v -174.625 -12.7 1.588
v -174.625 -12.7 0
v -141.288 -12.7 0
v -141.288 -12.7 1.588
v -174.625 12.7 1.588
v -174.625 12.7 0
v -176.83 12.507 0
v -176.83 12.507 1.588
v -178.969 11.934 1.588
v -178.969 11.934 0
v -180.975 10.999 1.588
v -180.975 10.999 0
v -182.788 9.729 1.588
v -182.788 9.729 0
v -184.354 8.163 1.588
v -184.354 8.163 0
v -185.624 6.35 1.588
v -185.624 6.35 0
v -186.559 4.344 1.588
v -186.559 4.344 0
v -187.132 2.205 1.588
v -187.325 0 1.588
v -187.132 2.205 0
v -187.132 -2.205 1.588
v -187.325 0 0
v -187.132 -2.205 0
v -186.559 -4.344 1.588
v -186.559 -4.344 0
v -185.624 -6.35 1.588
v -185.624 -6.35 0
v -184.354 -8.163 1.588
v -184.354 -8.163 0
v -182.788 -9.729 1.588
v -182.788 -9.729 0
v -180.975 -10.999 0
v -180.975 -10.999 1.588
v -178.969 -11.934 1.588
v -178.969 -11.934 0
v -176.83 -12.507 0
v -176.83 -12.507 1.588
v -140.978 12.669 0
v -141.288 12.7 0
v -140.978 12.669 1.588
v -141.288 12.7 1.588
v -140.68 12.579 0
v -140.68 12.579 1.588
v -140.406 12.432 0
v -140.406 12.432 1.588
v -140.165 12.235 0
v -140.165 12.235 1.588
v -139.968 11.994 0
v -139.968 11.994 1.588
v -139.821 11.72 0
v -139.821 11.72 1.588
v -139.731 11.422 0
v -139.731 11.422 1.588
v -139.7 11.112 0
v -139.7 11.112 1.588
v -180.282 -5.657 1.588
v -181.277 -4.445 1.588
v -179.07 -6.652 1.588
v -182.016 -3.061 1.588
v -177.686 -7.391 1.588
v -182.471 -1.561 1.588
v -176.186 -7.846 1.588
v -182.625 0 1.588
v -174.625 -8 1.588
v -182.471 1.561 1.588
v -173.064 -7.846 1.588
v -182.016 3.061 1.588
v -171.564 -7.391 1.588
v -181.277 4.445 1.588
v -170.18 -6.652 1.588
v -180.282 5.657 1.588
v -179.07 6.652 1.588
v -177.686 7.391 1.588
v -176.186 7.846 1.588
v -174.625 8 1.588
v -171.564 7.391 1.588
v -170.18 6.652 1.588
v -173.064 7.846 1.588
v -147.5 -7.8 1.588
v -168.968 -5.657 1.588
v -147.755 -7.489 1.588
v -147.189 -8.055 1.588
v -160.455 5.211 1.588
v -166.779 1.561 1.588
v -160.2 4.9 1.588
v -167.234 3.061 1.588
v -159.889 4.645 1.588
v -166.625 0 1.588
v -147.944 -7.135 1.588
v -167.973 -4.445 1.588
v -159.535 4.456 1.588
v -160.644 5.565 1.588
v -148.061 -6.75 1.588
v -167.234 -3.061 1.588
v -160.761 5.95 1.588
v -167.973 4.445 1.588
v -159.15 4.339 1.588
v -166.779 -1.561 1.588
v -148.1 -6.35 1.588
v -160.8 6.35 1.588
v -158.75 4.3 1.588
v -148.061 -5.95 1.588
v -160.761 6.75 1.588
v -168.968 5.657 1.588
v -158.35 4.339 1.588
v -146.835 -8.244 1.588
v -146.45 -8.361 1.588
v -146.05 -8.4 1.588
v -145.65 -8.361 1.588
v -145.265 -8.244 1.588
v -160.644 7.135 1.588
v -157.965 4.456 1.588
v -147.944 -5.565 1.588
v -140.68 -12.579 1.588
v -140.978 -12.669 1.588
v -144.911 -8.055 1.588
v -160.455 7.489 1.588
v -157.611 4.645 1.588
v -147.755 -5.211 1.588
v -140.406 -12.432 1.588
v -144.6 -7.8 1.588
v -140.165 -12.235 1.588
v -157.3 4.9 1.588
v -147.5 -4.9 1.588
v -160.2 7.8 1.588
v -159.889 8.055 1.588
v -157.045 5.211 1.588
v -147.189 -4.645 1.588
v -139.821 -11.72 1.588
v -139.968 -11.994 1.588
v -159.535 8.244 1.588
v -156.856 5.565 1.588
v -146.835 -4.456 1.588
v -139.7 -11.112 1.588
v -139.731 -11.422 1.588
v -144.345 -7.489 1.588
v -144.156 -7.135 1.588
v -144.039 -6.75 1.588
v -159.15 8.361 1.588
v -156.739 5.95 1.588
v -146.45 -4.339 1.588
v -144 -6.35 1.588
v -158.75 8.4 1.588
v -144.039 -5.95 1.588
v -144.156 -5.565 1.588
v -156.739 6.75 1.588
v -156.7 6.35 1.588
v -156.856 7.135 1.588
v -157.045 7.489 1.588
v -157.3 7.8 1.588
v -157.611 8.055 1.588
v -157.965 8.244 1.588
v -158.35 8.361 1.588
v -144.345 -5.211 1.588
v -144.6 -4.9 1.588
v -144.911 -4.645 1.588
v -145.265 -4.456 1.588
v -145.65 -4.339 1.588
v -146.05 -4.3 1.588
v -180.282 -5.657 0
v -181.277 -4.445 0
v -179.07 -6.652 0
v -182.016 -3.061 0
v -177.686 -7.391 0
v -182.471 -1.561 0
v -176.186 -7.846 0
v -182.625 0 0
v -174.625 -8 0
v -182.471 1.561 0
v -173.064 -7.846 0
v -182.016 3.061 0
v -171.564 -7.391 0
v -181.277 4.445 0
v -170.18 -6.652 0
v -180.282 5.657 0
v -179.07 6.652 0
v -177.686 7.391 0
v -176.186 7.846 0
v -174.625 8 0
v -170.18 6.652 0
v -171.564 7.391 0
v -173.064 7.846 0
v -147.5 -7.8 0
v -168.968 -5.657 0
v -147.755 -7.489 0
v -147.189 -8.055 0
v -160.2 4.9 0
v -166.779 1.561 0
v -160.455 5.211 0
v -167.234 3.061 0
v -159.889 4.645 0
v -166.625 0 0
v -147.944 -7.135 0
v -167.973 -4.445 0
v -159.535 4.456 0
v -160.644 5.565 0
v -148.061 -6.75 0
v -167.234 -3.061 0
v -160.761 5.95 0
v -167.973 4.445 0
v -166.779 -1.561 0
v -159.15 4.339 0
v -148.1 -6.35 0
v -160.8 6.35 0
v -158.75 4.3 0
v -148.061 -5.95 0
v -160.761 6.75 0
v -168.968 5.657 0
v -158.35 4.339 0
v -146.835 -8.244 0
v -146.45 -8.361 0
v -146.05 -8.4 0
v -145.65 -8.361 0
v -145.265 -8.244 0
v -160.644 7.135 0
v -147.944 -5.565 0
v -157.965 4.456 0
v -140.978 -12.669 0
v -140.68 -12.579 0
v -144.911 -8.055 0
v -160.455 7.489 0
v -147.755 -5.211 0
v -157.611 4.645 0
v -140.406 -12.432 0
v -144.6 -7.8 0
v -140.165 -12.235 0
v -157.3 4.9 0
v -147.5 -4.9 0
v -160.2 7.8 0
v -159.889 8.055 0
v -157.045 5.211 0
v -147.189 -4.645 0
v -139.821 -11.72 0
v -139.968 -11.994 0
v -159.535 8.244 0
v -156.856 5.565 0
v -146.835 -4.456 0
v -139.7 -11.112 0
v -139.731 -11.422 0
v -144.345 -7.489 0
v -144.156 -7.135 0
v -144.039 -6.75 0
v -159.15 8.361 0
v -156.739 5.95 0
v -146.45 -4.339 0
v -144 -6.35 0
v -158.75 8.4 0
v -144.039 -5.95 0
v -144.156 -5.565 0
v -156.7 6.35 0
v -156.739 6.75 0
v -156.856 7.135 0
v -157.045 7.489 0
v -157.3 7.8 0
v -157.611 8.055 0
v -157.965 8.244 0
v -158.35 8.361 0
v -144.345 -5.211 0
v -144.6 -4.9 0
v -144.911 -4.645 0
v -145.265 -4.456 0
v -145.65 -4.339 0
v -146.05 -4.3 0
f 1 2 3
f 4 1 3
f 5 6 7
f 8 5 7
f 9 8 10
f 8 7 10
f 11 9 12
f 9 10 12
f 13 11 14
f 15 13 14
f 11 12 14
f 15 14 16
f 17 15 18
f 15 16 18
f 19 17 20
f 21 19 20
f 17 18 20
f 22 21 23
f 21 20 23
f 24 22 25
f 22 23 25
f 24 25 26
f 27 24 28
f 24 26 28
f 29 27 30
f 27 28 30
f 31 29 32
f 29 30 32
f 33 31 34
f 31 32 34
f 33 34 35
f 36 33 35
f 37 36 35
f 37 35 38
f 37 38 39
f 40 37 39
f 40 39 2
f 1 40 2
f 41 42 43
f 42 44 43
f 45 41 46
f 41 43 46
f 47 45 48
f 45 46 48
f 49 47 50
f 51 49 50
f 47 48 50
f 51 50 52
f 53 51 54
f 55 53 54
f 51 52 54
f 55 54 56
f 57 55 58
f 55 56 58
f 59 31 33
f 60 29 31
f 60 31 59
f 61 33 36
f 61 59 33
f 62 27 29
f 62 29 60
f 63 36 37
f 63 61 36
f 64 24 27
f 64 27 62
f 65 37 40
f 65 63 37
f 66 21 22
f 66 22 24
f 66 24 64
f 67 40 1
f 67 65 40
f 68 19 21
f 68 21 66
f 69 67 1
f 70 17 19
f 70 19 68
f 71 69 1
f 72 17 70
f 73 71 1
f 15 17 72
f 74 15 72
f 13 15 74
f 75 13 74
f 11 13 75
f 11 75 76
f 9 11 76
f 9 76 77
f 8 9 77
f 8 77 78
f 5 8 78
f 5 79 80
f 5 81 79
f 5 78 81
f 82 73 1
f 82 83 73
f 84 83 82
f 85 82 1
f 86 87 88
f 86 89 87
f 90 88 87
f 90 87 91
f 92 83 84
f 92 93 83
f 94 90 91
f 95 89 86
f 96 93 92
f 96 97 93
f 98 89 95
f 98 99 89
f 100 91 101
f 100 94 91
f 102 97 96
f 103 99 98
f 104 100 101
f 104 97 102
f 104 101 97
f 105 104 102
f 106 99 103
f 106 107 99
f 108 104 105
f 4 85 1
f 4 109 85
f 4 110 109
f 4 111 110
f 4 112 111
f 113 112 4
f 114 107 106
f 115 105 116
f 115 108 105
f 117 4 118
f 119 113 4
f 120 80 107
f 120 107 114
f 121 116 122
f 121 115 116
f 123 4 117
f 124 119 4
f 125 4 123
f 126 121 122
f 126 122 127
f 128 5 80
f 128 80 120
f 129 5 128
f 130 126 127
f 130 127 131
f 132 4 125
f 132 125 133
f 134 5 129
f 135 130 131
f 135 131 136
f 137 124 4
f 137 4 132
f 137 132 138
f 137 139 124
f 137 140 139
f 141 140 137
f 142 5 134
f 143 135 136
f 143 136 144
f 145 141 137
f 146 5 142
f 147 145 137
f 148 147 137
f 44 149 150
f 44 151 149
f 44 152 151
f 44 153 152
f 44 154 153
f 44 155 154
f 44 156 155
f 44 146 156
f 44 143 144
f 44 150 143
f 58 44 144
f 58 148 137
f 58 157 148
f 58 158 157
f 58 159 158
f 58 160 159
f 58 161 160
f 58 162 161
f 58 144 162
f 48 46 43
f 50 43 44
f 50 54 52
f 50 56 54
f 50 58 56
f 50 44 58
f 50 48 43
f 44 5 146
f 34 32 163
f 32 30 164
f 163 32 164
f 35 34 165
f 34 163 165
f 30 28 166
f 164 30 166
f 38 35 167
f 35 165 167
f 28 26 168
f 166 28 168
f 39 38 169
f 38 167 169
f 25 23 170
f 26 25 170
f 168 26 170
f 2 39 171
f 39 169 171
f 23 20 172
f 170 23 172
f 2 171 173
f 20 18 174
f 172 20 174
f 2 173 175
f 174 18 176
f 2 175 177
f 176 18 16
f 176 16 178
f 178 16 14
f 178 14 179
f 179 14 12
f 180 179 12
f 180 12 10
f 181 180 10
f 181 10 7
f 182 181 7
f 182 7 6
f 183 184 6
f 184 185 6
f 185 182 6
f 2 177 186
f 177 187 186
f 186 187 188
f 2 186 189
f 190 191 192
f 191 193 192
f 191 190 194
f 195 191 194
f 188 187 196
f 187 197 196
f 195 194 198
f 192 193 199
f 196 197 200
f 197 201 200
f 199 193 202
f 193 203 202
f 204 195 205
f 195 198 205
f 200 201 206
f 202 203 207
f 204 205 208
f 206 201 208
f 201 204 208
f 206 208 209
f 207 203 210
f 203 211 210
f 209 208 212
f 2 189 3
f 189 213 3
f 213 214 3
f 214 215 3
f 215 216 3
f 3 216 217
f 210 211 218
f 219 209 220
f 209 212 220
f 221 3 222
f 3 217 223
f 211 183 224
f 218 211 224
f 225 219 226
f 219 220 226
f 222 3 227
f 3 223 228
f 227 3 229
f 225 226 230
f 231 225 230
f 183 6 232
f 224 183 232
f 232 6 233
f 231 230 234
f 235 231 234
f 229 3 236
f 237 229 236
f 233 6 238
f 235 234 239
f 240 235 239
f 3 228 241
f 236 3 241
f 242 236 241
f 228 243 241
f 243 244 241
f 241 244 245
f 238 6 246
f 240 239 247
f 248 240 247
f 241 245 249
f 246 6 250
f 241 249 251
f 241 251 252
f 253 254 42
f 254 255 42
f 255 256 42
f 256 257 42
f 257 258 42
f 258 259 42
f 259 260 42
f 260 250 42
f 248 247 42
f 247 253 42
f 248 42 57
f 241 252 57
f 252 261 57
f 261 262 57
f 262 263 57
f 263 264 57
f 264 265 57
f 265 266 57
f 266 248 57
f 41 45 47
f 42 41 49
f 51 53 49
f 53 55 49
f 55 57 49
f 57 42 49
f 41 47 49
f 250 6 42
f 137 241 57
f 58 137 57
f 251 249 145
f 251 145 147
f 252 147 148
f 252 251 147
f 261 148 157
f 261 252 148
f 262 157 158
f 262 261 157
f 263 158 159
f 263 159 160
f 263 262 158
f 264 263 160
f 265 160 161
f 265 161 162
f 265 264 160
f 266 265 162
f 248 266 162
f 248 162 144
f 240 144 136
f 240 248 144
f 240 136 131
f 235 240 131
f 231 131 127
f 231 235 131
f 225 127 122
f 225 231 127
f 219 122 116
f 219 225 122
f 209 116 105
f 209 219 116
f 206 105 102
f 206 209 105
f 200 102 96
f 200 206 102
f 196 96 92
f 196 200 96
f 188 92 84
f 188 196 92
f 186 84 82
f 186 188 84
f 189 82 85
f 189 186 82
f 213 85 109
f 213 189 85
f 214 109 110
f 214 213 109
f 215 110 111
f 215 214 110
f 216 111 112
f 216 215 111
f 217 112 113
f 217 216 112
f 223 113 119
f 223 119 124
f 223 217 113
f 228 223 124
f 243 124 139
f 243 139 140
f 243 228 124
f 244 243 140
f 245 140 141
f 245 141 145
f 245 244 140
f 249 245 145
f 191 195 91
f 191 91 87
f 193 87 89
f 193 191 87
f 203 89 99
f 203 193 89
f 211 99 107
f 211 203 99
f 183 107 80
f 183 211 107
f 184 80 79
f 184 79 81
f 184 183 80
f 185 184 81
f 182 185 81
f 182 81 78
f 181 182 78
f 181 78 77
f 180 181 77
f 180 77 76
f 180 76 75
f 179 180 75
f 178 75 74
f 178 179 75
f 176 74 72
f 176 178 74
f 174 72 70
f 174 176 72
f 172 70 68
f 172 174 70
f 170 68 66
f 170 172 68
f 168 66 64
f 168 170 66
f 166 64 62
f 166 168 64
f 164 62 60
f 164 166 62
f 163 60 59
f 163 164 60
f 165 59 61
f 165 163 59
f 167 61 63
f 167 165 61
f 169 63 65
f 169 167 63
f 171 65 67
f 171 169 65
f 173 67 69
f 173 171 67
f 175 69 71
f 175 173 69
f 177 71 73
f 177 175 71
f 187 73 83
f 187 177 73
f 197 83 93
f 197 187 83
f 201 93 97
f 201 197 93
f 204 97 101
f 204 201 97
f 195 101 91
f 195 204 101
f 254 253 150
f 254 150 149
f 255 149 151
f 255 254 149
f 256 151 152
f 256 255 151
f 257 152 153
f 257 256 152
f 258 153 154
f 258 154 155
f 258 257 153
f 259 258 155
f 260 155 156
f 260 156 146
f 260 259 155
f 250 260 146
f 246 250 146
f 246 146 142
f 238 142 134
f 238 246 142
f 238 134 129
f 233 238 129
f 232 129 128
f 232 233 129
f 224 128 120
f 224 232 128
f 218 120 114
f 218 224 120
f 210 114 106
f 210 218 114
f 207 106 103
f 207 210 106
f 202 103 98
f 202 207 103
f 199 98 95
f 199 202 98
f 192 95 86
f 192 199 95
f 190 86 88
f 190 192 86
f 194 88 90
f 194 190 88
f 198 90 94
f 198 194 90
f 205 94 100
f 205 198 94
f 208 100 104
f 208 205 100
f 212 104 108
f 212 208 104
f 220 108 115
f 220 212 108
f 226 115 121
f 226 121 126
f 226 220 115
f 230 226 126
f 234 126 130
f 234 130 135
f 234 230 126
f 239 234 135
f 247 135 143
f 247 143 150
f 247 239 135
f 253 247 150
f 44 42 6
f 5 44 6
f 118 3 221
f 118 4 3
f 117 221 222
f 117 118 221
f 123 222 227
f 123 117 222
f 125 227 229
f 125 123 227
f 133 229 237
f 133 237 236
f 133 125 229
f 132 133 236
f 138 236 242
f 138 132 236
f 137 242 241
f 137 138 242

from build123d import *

# Parameters (mm, degrees)
SKETCH1_R           = 8
SKETCH1_R_2         = 2.05
BOSS_EXTRUDE1_DEPTH = 1.5875
FILLET1_R           = 1.5875


with BuildPart() as part:
    # Sketch1 → Boss-Extrude1 (new body)
    with BuildSketch(Plane.XY):
        with BuildLine():
            ThreePointArc((-165.1, 8.400260413), (-169.399739587, 11.575260413), (-174.625, 12.7))
            ThreePointArc((-174.625, 12.7), (-187.325, 0), (-174.625, -12.7))
            ThreePointArc((-174.625, -12.7), (-169.399739587, -11.575260413), (-165.1, -8.400260413))
            Line((-165.1, -8.400260413), (-165.1, 8.400260413))
        make_face()
        with Locations((-174.625, 0)):
            Circle(SKETCH1_R, mode=Mode.SUBTRACT)
        with BuildLine():
            Line((-165.1, 12.7), (-174.625, 12.7))
            ThreePointArc((-174.625, 12.7), (-169.399739587, 11.575260413), (-165.1, 8.400260413))
            Line((-165.1, 8.400260413), (-165.1, 12.7))
        make_face()
        with BuildLine():
            Line((-139.7, 12.7), (-165.1, 12.7))
            Line((-165.1, 12.7), (-165.1, 8.400260413))
            ThreePointArc((-165.1, 8.400260413), (-162.745237797, 4.490128061), (-161.925, 0))
            ThreePointArc((-161.925, 0), (-162.745237797, -4.490128061), (-165.1, -8.400260413))
            Line((-165.1, -8.400260413), (-165.1, -12.7))
            Line((-165.1, -12.7), (-139.7, -12.7))
            Line((-139.7, -12.7), (-139.7, 12.7))
        make_face()
        with Locations((-146.05, -6.35)):
            Circle(SKETCH1_R_2, mode=Mode.SUBTRACT)
        with Locations((-158.75, 6.35)):
            Circle(SKETCH1_R_2, mode=Mode.SUBTRACT)
        with BuildLine():
            ThreePointArc((-161.925, 0), (-162.745237797, 4.490128061), (-165.1, 8.400260413))
            Line((-165.1, 8.400260413), (-165.1, -8.400260413))
            ThreePointArc((-165.1, -8.400260413), (-162.745237797, -4.490128061), (-161.925, 0))
        make_face()
        with BuildLine():
            ThreePointArc((-165.1, -8.400260413), (-169.399739587, -11.575260413), (-174.625, -12.7))
            Line((-174.625, -12.7), (-165.1, -12.7))
            Line((-165.1, -12.7), (-165.1, -8.400260413))
        make_face()
    extrude(amount=BOSS_EXTRUDE1_DEPTH)

    # Fillet1
    fillet1_edges = [part.edges().sort_by_distance(p)[0] for p in [
        (-139.7, 12.7, 0.79375),
        (-139.7, -12.7, 0.79375),
    ]]
    fillet(fillet1_edges, radius=FILLET1_R)


solid = part.part
